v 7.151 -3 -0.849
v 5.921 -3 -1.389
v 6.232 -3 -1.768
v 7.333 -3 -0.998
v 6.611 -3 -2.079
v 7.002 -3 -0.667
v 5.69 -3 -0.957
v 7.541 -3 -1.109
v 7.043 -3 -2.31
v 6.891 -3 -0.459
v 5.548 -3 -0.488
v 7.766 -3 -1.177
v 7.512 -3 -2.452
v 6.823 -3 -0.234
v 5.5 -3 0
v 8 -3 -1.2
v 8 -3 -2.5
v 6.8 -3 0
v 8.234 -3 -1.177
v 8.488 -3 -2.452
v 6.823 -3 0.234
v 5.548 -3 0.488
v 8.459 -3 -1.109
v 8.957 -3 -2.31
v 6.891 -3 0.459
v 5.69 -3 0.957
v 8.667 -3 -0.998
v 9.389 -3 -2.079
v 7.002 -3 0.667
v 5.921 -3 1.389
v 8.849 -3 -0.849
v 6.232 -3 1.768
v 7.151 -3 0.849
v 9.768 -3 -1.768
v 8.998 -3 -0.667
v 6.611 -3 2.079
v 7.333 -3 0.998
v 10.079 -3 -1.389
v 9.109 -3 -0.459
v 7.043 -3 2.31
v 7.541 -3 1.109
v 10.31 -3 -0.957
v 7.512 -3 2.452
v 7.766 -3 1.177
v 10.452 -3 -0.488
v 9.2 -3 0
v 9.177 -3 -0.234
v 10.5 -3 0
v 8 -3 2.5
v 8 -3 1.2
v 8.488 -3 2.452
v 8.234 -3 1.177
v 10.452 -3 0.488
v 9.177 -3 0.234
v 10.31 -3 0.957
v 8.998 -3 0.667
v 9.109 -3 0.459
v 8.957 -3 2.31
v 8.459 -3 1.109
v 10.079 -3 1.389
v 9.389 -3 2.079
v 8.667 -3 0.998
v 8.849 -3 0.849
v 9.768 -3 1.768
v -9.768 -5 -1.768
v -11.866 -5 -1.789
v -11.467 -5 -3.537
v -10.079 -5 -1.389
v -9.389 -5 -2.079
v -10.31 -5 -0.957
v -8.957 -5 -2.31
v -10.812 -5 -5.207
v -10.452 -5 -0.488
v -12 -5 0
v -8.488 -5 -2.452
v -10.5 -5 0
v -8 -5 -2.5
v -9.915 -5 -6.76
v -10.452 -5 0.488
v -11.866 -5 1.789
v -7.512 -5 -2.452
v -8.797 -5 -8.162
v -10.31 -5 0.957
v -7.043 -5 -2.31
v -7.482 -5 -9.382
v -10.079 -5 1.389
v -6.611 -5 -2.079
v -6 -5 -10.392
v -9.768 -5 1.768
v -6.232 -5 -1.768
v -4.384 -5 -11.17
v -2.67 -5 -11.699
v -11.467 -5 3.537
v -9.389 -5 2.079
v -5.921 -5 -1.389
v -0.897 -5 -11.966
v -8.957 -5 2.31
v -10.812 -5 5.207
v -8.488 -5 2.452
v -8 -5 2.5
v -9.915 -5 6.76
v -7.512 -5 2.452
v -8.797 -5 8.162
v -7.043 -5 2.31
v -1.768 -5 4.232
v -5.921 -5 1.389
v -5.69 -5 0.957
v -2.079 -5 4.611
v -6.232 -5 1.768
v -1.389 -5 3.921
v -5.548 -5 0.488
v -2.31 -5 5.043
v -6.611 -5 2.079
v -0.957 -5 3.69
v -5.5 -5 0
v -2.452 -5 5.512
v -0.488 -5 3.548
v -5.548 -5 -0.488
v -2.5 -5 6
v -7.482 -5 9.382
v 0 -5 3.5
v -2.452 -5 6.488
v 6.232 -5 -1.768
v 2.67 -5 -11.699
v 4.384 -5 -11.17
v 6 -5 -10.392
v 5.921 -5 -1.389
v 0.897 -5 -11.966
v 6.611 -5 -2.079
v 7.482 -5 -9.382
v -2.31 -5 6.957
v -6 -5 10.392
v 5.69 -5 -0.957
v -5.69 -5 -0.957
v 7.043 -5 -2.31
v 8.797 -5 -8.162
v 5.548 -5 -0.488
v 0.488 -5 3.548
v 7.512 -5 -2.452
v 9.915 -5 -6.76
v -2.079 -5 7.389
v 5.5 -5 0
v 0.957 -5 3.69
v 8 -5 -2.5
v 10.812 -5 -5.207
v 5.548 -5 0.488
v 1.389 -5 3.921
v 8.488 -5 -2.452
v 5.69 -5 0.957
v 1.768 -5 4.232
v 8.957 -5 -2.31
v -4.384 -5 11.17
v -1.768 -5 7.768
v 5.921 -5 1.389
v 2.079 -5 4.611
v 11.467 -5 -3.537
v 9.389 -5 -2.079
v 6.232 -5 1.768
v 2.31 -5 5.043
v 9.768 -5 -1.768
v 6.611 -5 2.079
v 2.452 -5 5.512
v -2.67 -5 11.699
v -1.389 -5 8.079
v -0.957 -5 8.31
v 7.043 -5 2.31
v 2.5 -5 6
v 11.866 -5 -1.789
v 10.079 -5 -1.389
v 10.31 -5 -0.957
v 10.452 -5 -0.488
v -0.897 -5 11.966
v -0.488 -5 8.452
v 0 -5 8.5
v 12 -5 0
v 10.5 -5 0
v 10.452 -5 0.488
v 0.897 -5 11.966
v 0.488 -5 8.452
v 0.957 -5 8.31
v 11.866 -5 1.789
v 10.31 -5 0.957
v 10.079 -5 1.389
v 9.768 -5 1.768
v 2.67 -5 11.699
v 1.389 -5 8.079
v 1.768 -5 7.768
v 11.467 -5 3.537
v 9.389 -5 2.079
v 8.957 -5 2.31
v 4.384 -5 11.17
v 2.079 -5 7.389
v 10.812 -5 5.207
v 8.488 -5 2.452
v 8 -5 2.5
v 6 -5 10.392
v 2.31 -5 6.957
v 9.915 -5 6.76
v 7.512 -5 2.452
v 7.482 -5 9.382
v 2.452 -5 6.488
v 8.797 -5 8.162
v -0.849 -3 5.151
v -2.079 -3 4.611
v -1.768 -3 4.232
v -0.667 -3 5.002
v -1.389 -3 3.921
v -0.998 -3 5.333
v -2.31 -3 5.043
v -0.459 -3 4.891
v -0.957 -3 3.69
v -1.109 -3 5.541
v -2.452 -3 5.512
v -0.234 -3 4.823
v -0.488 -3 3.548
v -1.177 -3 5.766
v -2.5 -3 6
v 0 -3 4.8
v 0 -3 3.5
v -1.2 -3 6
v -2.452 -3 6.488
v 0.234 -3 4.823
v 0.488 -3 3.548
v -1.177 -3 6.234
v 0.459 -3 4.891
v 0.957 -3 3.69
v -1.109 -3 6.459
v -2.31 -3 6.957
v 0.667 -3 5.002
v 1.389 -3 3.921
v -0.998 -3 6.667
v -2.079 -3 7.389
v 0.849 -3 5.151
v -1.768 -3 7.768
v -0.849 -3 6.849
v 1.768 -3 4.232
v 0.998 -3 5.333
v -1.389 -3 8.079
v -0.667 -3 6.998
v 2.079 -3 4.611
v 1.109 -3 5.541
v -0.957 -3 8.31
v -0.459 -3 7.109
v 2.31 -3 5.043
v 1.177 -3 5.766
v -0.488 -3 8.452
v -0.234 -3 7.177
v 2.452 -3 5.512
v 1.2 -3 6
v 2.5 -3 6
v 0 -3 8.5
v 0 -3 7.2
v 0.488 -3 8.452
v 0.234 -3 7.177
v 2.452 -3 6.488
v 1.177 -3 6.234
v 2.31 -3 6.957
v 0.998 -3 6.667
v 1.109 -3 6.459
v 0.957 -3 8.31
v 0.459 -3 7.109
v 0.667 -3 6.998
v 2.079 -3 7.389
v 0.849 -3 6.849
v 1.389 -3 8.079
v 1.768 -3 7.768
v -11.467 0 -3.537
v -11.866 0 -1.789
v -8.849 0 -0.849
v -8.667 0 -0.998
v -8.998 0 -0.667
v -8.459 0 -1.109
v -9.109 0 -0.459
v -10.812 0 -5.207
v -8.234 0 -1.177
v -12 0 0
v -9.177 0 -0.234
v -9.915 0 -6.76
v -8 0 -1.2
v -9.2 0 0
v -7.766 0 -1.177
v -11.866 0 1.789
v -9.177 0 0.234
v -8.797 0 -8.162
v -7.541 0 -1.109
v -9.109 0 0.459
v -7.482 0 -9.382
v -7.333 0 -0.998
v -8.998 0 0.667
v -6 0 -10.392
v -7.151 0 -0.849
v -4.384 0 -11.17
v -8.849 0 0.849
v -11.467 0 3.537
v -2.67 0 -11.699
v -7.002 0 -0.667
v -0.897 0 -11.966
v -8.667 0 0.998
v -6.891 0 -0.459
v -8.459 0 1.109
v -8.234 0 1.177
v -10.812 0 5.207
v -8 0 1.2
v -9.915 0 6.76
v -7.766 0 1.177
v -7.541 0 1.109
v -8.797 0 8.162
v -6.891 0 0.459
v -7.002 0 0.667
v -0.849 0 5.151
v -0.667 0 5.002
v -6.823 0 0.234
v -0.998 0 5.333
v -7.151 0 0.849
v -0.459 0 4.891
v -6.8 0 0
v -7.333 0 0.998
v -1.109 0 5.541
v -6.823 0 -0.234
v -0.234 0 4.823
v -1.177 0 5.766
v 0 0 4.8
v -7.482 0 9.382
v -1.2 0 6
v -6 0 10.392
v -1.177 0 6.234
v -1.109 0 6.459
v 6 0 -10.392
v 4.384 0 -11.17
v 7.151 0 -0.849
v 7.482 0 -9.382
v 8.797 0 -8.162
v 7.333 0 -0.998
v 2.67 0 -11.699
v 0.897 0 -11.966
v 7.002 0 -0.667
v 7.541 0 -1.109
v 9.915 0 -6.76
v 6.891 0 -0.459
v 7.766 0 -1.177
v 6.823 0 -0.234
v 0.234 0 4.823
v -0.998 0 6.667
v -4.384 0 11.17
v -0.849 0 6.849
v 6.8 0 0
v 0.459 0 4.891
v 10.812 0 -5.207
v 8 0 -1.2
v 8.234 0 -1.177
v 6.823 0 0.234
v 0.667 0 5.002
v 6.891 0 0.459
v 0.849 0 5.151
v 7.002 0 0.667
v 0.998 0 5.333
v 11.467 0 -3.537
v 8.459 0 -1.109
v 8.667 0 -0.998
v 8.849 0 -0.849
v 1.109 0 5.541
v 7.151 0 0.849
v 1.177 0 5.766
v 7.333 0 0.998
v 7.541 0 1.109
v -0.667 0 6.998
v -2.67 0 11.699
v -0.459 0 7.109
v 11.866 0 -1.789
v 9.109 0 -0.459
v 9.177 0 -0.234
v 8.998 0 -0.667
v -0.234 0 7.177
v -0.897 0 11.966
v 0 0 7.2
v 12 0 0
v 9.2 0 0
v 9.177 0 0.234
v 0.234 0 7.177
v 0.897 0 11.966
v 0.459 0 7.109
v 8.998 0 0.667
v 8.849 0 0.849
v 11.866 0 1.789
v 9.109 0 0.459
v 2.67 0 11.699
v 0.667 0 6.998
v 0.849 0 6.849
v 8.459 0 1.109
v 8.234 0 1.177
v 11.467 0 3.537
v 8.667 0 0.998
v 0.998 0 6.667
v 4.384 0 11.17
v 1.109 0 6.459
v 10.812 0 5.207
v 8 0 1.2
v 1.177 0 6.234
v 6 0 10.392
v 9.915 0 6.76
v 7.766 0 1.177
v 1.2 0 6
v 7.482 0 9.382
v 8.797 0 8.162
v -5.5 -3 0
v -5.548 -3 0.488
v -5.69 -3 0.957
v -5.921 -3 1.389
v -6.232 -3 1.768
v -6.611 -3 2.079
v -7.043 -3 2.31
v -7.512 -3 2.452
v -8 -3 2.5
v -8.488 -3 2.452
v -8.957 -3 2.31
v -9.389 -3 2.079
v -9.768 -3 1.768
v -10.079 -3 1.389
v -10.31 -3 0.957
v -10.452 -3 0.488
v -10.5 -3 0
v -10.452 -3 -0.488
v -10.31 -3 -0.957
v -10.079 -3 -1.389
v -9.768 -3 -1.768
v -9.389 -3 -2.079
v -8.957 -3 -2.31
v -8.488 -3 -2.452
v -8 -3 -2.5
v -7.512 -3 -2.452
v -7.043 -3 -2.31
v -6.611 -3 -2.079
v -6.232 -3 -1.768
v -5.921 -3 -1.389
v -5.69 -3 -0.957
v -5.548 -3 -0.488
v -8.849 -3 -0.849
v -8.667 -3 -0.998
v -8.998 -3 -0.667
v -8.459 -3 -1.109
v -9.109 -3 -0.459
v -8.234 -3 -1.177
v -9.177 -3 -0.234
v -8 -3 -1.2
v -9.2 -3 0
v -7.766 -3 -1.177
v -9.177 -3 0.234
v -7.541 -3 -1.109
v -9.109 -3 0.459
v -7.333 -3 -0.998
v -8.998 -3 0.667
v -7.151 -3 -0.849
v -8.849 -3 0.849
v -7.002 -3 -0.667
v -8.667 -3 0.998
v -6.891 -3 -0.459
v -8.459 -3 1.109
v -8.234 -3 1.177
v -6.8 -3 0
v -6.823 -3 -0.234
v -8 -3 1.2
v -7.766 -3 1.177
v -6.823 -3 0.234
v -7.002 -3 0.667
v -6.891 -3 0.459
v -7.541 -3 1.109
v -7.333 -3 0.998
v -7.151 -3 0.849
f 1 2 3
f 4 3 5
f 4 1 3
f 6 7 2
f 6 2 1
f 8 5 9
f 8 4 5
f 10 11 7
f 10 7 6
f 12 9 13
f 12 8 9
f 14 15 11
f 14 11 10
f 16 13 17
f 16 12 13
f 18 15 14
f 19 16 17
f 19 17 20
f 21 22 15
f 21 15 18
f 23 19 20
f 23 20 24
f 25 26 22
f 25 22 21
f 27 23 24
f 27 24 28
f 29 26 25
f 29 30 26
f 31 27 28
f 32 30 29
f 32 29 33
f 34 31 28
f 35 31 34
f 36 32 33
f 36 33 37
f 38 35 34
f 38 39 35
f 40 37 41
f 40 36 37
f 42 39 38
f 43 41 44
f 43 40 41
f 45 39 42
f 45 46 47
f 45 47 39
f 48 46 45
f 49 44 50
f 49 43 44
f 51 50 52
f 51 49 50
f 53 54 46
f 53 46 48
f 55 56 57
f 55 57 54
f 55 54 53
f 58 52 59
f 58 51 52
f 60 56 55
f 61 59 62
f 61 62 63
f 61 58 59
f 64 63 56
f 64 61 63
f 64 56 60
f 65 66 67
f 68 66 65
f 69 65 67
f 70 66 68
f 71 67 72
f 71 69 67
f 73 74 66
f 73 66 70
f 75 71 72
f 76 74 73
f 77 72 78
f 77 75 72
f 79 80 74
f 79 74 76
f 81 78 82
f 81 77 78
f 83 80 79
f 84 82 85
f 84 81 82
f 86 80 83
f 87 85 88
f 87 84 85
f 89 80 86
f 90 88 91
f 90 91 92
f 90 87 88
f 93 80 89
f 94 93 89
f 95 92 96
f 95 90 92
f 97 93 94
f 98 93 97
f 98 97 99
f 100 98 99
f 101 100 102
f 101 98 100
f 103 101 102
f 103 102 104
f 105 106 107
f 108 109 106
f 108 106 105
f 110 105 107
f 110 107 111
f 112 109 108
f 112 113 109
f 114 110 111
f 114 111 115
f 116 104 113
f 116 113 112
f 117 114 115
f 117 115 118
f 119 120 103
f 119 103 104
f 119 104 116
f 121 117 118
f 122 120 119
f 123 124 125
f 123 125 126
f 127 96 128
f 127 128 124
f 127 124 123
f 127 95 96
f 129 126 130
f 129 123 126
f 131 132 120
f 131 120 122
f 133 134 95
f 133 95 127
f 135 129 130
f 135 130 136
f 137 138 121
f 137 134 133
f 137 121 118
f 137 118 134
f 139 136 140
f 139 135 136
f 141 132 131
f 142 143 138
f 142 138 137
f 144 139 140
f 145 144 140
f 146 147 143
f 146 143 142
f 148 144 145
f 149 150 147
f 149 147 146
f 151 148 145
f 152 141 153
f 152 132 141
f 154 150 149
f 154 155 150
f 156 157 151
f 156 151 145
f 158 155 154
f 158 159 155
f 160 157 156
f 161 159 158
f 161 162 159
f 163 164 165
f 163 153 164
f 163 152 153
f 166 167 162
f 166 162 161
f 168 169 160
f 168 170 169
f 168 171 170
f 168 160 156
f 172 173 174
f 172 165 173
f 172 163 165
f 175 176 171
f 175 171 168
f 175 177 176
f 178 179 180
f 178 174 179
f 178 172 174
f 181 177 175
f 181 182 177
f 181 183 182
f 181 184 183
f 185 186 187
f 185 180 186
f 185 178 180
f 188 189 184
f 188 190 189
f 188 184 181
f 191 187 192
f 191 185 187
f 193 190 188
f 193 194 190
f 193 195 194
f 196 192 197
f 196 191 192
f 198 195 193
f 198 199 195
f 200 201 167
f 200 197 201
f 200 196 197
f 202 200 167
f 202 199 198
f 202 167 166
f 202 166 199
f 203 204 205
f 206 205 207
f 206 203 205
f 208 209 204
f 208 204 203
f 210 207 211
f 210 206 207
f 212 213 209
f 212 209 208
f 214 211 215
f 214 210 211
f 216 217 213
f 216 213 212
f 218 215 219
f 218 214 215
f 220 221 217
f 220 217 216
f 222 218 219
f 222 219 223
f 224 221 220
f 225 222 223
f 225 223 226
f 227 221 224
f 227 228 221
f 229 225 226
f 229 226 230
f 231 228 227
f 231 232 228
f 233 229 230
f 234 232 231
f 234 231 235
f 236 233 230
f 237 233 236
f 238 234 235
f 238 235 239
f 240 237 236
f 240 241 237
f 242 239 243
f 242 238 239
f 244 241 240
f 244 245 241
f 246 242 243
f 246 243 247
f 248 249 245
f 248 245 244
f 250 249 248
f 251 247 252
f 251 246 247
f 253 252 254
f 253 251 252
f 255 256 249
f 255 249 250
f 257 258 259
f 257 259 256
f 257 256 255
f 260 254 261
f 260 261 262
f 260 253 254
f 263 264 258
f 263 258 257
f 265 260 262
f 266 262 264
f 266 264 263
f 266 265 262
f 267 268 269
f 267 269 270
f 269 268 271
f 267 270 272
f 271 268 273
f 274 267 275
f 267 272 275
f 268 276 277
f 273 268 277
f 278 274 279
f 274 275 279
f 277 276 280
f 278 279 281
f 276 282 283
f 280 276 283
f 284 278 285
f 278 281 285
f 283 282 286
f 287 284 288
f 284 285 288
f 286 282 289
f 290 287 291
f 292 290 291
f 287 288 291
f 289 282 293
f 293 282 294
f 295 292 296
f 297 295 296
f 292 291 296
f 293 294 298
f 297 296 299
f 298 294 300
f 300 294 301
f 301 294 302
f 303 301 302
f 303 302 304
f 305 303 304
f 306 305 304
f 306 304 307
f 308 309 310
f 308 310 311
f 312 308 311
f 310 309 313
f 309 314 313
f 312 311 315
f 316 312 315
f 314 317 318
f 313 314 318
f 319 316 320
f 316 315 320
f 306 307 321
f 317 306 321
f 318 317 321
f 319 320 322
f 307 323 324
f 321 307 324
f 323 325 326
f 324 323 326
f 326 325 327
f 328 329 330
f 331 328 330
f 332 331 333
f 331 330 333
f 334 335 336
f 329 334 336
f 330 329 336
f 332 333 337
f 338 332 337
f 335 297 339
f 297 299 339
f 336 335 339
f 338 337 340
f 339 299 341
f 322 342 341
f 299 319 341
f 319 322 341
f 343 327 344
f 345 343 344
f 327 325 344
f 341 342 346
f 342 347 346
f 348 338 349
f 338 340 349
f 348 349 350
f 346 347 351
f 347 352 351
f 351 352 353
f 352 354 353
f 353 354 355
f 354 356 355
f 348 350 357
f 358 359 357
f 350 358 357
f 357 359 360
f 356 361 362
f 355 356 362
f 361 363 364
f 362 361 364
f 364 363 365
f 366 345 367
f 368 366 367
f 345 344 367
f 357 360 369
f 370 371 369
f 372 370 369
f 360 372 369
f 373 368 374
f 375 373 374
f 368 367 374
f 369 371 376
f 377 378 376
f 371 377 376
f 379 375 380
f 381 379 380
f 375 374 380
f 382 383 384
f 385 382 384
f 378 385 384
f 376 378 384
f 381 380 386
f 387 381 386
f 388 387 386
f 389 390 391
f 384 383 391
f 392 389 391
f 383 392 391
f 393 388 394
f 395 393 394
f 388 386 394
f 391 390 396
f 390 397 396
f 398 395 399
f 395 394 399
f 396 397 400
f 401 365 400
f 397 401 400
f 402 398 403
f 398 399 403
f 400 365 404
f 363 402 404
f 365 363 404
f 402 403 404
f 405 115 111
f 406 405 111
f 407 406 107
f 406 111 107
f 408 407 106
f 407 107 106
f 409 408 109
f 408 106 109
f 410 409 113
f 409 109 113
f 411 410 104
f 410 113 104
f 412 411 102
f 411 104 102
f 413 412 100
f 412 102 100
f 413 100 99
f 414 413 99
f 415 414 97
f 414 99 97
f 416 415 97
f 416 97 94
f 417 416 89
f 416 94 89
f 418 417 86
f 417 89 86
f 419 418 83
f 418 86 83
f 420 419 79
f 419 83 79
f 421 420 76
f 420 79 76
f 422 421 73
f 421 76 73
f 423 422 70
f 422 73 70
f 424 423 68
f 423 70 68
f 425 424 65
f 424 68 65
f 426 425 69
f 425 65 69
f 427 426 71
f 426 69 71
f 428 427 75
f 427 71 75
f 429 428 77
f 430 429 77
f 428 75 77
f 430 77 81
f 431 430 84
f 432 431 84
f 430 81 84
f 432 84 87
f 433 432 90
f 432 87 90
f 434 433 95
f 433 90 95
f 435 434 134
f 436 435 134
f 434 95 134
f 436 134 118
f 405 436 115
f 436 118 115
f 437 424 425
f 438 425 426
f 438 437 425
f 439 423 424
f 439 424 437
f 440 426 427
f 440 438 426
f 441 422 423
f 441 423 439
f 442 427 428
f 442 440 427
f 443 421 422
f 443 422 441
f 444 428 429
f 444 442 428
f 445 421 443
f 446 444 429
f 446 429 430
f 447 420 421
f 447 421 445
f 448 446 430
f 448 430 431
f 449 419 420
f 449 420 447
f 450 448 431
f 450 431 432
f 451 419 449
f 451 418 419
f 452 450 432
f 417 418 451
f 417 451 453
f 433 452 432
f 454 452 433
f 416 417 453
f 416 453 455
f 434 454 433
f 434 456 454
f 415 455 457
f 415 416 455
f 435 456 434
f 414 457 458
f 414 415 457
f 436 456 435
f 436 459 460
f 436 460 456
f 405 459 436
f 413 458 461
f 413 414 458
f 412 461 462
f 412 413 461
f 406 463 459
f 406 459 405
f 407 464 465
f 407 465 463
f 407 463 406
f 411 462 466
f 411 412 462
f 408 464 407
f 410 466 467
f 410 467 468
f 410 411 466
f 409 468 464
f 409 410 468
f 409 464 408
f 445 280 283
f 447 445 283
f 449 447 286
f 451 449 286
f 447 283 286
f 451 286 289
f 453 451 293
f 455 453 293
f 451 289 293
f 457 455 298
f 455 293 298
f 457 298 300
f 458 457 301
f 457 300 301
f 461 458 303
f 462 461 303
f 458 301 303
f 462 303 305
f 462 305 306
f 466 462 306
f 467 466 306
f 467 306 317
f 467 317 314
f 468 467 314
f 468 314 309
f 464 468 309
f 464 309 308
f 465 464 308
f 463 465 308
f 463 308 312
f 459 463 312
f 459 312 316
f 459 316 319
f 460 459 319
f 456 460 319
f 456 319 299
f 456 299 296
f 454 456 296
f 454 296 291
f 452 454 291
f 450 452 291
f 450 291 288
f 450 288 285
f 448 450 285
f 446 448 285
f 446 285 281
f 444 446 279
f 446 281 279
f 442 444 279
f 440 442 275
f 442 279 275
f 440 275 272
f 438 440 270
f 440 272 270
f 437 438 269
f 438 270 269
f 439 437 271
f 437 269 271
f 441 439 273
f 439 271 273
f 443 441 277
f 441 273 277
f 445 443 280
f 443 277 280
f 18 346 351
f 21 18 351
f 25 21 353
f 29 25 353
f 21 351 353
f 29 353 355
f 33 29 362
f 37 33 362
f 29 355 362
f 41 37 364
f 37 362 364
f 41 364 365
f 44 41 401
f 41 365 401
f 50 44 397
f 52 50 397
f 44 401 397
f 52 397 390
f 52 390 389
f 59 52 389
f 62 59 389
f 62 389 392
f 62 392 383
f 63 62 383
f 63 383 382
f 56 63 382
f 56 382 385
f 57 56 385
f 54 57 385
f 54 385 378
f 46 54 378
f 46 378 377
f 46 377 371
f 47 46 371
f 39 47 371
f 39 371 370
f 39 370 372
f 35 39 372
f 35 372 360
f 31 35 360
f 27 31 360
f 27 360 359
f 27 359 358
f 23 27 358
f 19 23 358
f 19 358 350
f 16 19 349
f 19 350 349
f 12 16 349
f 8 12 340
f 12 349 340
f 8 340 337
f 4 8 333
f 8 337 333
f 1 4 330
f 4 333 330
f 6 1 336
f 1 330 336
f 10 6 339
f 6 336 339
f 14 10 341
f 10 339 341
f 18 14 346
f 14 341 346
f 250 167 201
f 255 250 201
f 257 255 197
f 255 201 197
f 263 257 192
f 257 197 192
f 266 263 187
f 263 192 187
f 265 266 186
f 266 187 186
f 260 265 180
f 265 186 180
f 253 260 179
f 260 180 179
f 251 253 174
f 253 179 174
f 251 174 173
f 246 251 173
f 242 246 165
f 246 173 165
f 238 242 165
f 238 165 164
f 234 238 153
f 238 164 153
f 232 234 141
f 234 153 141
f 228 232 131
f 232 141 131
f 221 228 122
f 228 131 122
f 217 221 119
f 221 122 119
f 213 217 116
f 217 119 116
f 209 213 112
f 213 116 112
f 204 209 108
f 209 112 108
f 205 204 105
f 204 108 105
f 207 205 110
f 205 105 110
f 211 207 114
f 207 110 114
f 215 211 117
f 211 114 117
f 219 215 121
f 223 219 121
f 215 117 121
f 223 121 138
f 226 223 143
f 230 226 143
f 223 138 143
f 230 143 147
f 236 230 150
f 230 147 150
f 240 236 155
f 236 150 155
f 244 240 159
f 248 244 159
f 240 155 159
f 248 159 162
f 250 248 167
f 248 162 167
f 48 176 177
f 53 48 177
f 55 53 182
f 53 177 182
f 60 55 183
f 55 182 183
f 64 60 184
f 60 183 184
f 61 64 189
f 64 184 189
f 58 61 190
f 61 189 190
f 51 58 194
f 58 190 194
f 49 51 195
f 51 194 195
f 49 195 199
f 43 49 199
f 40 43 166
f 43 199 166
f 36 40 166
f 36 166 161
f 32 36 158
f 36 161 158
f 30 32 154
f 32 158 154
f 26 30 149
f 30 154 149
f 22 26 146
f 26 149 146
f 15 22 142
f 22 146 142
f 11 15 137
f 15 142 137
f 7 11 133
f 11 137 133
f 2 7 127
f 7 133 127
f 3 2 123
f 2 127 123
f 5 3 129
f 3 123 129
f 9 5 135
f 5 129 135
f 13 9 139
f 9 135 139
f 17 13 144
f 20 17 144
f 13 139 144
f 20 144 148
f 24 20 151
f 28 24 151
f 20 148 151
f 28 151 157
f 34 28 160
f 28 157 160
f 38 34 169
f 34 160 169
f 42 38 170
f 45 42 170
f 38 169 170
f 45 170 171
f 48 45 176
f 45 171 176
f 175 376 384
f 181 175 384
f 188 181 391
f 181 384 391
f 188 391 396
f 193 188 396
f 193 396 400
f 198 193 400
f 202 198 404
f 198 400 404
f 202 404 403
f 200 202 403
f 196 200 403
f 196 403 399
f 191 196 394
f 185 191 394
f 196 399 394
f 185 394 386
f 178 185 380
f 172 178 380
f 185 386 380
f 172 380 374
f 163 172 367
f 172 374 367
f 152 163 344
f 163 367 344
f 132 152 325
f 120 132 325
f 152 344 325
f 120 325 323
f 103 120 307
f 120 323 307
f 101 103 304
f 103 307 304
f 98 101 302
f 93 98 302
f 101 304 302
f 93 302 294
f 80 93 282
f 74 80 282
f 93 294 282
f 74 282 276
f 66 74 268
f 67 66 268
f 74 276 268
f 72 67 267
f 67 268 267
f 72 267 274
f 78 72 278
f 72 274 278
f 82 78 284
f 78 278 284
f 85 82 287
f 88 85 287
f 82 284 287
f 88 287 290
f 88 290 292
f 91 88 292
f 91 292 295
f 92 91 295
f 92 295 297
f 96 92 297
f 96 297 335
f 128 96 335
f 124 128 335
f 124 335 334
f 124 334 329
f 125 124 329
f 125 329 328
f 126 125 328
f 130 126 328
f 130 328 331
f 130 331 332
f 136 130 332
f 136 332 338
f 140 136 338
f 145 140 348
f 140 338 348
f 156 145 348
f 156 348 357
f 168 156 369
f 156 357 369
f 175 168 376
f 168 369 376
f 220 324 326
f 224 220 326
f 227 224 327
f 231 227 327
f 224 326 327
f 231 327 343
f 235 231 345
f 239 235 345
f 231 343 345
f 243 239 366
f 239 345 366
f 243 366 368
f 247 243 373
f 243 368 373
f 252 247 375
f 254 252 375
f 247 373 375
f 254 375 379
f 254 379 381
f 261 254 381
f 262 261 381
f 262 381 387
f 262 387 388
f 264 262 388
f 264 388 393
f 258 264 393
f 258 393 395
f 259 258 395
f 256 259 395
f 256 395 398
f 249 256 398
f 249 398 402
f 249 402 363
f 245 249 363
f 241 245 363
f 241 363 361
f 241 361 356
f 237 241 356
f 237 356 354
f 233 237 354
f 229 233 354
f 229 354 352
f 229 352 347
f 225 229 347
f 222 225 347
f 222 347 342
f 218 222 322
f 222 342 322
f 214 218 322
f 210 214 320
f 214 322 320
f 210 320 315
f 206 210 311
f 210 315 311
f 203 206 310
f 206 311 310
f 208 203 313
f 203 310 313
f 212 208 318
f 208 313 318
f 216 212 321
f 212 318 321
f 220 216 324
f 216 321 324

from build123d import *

# Parameters (mm, degrees)
F0_R     = 12
F1_DEPTH = 5
F2_R     = 1.2
F3_DEPTH = 5
F4_R     = 2.5
F5_DEPTH = 2


with BuildPart() as f1:
    # F0 (on Front) → F1 (new body)
    with BuildSketch(Plane.XZ):
        Circle(F0_R)
    extrude(amount=F1_DEPTH)

    # F2 (on face) → F3 (cut)
    with BuildSketch(Plane(origin=(0, 0, 0), x_dir=(-1, 0, 0), z_dir=(0, 1, 0))):
        with Locations((8, 0)):
            Circle(F2_R)
        with Locations((-8, 0)):
            Circle(F2_R)
        with Locations((0, 6)):
            Circle(F2_R)
    extrude(amount=-F3_DEPTH, mode=Mode.SUBTRACT)

    # F4 (on face) → F5 (cut)
    with BuildSketch(Plane.XZ.offset(5)):
        with Locations((0, 6)):
            Circle(F4_R)
        with Locations((8, 0)):
            Circle(F4_R)
        with Locations((-8, 0)):
            Circle(F4_R)
    extrude(amount=-F5_DEPTH, mode=Mode.SUBTRACT)


solid = f1.part
